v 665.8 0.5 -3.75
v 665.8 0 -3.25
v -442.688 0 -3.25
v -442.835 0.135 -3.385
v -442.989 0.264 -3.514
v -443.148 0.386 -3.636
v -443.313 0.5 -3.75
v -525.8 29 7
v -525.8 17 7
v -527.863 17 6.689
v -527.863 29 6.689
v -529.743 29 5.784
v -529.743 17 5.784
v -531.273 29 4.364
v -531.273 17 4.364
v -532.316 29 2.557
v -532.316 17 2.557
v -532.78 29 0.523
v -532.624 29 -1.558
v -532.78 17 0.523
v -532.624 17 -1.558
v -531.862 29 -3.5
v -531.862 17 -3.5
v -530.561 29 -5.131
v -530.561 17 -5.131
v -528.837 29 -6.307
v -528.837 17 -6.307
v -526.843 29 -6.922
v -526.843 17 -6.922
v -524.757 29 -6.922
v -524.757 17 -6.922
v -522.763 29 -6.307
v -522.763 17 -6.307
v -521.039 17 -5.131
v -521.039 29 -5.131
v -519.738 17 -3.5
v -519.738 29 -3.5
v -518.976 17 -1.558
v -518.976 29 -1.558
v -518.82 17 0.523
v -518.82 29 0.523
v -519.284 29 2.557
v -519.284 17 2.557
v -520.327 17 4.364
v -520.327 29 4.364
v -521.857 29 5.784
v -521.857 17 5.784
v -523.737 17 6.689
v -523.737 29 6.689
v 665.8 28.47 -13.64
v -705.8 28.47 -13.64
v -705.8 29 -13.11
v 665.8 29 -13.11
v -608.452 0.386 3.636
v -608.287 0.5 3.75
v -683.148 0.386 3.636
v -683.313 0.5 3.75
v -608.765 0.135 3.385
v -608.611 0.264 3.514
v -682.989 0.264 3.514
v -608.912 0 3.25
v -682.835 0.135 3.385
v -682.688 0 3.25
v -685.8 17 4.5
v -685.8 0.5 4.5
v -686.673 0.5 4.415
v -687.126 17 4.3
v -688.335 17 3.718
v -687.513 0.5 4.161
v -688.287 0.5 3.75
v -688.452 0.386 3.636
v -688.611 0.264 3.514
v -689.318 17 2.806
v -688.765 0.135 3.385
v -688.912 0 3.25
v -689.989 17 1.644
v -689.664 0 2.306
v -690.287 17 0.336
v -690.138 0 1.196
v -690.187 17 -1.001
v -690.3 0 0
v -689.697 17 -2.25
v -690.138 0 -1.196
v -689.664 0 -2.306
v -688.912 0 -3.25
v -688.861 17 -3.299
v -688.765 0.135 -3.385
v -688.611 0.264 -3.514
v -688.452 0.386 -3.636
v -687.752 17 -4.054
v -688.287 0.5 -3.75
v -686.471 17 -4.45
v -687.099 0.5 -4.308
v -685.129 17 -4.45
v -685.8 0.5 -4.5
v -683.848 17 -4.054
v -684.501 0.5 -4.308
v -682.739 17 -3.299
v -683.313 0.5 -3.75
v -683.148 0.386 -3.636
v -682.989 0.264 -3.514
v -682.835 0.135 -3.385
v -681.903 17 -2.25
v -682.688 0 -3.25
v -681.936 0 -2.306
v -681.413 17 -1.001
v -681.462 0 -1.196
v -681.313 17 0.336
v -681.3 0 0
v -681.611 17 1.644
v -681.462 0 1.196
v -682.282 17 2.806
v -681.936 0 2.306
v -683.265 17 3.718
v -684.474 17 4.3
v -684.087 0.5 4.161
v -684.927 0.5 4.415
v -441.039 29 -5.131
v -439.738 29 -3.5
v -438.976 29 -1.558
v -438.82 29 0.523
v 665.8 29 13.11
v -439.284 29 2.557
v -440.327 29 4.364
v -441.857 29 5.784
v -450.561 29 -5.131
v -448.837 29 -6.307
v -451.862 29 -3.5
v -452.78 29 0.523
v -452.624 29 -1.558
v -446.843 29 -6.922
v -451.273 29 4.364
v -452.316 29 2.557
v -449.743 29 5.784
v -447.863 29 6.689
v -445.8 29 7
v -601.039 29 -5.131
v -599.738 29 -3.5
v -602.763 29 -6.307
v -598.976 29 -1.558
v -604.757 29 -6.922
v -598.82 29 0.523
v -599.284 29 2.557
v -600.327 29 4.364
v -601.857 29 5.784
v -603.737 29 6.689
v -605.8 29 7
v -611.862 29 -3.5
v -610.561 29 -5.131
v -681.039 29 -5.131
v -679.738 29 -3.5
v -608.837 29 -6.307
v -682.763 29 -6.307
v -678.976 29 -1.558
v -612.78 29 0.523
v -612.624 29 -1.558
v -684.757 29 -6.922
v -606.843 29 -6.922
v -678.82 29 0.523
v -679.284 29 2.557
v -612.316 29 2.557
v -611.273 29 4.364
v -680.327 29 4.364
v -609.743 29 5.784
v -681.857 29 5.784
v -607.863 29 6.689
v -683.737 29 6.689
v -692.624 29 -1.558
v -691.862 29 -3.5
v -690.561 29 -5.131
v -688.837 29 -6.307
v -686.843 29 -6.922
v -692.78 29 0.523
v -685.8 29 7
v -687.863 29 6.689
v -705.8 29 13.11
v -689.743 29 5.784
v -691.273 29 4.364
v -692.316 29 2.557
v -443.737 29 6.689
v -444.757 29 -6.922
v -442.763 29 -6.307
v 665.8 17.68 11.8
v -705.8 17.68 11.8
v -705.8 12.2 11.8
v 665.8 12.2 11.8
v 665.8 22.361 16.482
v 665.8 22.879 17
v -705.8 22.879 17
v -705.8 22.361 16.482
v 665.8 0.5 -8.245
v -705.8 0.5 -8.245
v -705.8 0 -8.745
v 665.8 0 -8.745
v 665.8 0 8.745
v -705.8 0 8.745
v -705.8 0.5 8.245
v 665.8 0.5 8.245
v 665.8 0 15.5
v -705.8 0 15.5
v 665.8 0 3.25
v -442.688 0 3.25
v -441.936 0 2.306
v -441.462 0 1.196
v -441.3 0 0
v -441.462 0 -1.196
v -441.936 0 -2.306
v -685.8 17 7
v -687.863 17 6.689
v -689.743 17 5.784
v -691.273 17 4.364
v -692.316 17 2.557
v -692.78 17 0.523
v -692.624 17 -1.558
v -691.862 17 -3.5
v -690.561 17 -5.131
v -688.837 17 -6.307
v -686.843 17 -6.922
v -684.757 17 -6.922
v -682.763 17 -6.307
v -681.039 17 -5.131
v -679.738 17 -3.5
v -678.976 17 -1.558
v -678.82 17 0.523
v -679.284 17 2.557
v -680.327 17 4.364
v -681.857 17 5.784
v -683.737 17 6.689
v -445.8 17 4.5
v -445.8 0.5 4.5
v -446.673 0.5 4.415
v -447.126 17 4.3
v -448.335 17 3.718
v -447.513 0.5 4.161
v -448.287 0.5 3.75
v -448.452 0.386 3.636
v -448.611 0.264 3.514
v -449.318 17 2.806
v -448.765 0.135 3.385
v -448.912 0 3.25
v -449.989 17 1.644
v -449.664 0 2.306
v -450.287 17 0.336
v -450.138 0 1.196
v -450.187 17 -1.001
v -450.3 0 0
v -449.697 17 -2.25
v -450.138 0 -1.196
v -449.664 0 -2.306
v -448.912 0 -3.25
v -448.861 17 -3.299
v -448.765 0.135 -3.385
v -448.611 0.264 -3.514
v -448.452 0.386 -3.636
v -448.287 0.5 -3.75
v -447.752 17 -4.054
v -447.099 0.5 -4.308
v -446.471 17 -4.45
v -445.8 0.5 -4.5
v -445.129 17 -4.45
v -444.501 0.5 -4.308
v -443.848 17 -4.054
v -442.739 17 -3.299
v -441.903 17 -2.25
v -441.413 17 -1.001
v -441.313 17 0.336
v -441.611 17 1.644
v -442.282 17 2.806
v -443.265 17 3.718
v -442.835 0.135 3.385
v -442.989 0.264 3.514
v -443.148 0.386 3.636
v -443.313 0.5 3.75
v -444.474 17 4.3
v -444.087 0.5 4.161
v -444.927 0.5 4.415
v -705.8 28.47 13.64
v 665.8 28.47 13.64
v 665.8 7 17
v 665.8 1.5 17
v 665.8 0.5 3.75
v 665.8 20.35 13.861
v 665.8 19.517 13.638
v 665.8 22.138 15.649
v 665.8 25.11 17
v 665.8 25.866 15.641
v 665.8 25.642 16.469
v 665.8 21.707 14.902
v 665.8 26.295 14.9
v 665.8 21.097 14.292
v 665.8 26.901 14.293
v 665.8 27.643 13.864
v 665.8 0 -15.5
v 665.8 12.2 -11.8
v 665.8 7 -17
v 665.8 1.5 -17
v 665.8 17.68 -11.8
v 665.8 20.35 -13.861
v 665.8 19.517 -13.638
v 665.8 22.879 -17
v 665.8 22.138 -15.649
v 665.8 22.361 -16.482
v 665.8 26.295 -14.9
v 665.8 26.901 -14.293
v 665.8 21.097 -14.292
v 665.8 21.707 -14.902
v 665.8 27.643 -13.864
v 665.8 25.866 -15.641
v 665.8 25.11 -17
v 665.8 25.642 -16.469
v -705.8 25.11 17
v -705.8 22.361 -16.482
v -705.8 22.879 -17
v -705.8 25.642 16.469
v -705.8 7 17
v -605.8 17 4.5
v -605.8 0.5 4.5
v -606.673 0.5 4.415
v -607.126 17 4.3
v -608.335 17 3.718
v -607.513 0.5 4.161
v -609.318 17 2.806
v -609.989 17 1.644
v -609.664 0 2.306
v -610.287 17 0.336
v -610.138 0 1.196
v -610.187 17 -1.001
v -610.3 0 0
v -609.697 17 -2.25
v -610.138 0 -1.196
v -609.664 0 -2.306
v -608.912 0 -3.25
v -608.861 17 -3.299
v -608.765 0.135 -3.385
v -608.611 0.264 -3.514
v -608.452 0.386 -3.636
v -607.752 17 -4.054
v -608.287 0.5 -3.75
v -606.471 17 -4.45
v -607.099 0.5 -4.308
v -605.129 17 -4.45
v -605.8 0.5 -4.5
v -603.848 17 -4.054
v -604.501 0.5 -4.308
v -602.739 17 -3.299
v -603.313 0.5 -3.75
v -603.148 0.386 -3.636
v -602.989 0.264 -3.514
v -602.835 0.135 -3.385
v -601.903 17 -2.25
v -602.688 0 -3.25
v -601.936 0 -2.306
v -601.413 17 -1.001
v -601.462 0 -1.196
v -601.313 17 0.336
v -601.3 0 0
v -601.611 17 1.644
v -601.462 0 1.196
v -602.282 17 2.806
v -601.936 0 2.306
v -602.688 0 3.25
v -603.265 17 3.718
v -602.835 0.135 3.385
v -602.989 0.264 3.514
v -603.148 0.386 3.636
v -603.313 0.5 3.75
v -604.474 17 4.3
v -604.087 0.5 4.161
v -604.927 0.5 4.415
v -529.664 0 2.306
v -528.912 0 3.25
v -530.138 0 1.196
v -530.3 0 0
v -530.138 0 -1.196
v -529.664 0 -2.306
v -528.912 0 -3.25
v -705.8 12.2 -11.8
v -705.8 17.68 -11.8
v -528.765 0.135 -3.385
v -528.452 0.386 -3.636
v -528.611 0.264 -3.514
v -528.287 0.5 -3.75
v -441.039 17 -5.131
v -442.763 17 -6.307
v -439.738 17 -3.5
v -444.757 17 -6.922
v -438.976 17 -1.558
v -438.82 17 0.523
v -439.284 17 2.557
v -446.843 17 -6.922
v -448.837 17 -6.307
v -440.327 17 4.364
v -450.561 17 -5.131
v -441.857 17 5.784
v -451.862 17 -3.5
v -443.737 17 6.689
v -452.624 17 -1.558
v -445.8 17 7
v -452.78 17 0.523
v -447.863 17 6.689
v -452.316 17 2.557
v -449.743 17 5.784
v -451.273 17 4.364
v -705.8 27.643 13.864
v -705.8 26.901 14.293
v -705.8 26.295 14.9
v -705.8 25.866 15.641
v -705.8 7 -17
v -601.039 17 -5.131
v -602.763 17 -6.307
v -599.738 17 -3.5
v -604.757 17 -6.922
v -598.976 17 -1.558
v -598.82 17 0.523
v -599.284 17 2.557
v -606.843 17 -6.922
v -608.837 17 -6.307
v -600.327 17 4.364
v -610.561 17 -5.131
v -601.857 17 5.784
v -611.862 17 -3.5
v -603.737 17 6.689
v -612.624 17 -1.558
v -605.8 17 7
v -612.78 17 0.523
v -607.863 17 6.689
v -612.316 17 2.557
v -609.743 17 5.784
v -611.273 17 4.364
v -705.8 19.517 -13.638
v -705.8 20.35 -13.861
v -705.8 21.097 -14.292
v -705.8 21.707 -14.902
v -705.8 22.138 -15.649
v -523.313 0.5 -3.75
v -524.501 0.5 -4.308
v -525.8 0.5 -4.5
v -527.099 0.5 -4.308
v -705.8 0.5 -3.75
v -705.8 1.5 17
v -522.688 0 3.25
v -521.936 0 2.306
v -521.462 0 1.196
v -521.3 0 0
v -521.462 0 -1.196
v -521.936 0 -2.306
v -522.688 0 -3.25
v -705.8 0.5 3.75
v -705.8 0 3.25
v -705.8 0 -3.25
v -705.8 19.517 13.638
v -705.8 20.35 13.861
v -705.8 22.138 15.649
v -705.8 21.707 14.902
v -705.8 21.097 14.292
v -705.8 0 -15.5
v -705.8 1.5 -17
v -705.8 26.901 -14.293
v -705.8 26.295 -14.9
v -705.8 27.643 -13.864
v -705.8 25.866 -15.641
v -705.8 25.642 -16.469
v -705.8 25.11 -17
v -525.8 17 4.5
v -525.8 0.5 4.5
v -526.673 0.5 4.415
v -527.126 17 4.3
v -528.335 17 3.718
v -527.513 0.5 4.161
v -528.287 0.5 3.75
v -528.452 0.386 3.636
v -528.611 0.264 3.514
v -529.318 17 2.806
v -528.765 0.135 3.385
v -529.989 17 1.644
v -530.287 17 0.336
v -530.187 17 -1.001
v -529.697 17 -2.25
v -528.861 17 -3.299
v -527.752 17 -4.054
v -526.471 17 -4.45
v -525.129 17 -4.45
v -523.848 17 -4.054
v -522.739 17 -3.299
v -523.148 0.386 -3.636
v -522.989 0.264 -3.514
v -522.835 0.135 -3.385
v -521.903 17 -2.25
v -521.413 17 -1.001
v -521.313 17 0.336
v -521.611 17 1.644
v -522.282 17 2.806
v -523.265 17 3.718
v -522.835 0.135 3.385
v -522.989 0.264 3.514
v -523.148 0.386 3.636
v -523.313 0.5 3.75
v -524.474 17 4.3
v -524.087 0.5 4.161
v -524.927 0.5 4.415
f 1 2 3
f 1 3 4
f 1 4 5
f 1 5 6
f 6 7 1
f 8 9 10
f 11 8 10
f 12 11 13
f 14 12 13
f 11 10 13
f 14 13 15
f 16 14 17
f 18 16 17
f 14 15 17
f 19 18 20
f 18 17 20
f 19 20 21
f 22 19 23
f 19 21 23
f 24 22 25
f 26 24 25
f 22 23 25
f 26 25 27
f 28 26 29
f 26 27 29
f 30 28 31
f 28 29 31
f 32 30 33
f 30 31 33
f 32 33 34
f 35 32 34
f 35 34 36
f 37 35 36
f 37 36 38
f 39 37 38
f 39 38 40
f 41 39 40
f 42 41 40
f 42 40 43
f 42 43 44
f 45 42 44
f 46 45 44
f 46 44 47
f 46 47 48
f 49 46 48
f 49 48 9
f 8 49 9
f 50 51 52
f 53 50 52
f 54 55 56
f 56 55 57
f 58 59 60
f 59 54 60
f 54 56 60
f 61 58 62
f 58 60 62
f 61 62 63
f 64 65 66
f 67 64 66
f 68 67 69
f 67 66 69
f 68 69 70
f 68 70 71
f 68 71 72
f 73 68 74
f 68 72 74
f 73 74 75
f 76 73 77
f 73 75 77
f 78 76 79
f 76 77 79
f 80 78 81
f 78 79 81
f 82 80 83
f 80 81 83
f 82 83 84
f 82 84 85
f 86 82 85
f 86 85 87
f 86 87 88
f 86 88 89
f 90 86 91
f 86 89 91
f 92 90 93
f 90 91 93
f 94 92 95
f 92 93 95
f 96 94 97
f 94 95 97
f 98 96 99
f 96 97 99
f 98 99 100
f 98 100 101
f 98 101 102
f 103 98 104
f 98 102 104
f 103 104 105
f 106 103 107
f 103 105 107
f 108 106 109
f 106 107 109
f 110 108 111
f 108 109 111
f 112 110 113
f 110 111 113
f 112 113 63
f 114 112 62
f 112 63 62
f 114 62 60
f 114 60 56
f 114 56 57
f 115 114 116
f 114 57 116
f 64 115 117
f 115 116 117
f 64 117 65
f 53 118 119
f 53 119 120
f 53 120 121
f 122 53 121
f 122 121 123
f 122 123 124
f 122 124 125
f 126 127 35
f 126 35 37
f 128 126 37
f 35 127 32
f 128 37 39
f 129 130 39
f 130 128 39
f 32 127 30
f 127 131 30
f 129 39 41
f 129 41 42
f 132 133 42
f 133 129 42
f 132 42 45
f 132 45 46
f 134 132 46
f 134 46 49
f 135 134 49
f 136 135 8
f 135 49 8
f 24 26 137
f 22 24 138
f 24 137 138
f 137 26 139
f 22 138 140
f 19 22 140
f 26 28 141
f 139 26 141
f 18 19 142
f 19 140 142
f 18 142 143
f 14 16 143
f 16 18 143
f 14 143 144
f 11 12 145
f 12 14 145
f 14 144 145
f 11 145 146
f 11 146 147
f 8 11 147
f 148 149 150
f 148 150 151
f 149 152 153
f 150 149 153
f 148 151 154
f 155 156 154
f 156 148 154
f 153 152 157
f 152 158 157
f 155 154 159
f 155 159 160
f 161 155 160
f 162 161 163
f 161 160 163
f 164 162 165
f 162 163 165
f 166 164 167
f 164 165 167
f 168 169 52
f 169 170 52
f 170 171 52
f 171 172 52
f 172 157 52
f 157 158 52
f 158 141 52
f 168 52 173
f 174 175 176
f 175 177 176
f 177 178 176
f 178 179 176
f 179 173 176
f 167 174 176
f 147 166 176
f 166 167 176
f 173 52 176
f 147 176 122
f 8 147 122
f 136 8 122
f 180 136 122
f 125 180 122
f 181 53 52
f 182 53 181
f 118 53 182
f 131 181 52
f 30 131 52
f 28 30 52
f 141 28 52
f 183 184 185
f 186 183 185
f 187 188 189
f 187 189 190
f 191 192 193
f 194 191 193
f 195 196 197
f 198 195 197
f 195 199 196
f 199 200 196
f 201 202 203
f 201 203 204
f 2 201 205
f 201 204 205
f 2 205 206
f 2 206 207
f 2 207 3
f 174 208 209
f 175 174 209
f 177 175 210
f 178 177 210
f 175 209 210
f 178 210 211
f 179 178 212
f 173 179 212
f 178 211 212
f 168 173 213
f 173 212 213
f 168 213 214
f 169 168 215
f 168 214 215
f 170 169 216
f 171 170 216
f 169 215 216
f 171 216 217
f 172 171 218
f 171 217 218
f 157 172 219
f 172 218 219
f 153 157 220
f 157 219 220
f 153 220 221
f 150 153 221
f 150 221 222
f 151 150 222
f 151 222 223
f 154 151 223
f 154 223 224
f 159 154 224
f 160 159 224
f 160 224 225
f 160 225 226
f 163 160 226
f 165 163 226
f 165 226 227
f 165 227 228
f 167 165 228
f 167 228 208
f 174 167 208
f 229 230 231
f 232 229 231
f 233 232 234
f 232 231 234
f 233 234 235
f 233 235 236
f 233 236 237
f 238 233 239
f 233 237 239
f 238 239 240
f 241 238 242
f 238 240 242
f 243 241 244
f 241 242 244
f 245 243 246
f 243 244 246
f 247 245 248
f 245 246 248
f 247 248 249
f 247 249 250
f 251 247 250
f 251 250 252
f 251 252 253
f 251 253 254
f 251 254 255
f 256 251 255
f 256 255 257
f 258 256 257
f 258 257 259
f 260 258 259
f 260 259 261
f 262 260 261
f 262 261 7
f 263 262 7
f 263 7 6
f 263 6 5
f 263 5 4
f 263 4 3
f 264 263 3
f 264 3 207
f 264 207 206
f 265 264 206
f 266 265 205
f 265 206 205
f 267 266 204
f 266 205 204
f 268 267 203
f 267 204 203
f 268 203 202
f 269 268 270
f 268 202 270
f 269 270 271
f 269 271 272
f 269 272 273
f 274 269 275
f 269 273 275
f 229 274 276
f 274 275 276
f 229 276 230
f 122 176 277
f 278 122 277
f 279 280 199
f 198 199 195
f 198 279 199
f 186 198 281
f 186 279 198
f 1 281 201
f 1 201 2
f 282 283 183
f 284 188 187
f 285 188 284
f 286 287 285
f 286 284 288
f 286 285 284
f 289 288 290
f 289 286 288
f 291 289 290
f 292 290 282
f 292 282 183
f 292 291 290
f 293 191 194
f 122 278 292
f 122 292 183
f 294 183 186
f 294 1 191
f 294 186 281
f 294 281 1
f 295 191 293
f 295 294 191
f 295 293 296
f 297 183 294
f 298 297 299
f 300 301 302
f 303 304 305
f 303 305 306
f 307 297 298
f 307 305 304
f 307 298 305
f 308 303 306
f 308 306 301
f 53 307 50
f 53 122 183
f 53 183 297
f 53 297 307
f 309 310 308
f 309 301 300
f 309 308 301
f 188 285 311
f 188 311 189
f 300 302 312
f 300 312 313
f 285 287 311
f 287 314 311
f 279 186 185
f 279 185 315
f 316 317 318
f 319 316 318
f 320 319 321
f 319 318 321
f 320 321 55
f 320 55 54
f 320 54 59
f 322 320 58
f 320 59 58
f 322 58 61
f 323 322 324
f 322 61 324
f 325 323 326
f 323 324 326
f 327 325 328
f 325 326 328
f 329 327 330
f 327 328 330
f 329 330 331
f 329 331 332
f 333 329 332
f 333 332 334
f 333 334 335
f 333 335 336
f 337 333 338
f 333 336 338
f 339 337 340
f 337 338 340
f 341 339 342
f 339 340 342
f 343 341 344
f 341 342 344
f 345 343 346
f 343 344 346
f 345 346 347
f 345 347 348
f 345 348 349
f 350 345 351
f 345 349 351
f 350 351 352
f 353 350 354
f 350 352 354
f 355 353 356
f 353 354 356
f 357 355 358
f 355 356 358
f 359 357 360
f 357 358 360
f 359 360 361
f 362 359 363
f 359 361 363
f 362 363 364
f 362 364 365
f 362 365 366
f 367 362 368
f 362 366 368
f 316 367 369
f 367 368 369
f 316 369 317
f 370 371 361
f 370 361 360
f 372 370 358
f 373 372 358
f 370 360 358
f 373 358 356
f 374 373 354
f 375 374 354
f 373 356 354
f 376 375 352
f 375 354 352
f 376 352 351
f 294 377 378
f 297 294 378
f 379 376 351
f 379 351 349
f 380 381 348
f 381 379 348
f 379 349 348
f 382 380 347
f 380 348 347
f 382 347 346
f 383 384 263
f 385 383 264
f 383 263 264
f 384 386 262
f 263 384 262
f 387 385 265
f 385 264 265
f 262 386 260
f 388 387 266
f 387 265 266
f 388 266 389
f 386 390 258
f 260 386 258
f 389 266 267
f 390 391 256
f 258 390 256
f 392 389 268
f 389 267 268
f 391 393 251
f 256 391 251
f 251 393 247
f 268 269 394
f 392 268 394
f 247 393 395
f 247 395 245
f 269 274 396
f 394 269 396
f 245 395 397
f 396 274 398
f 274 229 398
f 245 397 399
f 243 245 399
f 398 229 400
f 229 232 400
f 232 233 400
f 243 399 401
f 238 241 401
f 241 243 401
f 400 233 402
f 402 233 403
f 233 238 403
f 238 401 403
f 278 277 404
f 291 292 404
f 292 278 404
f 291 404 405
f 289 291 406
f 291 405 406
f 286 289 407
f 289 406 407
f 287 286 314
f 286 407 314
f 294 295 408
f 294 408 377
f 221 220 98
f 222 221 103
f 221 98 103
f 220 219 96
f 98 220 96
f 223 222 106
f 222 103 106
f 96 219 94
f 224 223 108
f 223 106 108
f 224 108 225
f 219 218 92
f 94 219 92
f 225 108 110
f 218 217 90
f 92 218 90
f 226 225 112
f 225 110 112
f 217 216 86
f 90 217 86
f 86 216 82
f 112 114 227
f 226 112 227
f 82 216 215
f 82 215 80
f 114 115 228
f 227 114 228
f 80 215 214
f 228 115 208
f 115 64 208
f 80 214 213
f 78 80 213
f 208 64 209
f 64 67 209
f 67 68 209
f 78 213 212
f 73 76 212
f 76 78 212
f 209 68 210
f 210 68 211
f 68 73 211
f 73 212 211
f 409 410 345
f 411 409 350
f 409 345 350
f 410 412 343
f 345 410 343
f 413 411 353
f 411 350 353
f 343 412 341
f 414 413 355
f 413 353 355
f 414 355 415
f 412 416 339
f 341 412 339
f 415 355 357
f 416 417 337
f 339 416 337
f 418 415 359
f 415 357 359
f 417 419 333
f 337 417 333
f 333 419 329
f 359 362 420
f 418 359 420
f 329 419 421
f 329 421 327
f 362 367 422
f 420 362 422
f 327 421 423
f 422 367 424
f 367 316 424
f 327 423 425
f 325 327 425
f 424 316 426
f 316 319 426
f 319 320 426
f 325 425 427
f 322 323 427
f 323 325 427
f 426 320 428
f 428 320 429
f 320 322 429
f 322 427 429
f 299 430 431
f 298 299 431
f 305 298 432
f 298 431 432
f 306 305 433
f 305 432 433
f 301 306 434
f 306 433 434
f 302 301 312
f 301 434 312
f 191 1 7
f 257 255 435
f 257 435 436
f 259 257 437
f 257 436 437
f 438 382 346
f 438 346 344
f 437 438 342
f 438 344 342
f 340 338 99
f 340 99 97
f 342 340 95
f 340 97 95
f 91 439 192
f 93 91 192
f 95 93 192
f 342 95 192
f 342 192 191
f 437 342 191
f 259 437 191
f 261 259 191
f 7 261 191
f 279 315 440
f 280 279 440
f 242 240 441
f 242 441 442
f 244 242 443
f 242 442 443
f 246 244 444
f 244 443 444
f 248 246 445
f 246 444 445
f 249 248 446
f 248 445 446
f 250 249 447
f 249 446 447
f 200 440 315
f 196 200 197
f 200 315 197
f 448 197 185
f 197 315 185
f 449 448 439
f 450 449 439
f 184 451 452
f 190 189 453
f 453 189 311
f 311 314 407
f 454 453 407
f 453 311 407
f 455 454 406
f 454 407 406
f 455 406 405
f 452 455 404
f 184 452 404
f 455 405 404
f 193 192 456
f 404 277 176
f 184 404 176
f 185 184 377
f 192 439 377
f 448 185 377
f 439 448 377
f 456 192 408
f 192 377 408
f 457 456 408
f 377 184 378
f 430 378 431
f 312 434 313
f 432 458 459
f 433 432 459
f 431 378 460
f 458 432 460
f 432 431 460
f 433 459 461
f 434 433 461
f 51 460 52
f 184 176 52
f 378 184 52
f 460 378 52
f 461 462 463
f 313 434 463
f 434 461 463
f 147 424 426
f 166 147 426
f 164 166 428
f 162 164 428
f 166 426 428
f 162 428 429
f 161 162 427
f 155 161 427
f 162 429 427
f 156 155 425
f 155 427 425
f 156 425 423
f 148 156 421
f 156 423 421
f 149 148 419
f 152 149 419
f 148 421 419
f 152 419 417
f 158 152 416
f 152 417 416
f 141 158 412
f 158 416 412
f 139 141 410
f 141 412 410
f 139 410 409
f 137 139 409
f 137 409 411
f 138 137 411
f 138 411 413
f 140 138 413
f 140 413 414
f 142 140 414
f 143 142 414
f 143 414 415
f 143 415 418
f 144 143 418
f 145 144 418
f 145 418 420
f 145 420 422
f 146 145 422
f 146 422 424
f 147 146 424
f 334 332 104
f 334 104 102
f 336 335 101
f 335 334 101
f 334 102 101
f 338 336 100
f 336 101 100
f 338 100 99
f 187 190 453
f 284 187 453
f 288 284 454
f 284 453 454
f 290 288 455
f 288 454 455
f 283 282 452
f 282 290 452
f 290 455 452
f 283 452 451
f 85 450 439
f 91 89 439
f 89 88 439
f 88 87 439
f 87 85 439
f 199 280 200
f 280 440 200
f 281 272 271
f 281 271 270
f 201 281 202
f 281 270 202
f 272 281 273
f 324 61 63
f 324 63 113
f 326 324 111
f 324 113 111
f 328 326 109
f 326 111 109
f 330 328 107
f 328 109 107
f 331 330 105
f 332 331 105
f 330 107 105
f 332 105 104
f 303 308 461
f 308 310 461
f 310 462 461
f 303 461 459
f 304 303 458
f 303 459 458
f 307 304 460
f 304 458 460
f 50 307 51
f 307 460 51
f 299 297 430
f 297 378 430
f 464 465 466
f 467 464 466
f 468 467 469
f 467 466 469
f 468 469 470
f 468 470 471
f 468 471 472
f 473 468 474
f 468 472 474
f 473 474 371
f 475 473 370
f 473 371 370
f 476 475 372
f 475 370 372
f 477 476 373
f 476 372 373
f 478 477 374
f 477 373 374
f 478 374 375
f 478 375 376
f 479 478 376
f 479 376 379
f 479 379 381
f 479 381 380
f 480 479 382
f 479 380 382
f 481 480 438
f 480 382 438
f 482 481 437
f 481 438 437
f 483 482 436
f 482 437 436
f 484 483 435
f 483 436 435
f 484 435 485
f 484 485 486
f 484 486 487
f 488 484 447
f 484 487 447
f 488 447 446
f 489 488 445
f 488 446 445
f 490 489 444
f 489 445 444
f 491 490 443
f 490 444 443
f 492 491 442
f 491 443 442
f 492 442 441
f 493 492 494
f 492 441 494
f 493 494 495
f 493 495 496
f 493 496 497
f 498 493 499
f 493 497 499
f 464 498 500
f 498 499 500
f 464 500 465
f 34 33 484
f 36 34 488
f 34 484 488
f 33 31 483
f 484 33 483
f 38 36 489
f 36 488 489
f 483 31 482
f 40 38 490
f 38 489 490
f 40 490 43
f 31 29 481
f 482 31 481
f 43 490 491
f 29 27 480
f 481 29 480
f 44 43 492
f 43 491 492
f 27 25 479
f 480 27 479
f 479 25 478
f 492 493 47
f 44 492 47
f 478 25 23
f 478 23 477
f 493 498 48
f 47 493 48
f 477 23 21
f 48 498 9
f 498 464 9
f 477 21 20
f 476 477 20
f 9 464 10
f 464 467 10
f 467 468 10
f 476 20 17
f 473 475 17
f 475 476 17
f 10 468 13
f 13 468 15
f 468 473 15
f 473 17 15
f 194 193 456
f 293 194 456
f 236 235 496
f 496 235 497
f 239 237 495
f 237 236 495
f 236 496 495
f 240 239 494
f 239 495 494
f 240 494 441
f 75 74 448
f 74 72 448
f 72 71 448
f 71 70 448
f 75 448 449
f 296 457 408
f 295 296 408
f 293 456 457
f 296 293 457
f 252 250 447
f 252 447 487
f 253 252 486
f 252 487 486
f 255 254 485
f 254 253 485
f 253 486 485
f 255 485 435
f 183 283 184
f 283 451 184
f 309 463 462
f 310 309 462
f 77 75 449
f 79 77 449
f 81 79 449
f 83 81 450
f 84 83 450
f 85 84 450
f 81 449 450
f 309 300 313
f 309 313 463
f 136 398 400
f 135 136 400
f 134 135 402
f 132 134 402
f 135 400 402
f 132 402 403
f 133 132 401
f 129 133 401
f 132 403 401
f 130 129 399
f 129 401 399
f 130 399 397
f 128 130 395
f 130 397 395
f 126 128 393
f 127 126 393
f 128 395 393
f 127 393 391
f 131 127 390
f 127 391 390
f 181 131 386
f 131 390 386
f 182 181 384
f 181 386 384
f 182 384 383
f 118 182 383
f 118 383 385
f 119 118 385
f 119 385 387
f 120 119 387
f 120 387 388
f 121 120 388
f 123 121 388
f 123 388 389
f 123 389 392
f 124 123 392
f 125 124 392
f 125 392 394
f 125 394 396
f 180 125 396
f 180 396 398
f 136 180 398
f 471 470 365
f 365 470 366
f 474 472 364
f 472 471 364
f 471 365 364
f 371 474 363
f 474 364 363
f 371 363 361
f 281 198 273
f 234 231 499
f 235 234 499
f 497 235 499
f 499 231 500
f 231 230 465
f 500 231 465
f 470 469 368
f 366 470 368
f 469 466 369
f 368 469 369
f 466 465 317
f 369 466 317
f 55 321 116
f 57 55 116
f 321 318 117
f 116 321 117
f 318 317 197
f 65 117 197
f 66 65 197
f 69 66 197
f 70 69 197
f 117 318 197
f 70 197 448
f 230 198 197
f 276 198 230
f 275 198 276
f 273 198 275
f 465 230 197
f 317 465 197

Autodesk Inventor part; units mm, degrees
sketch "Sketch_18" plane through (-20, 0, 0) normal (1, 0, 0) x (0, 0, -1)
  line L0 (-17, 1.5) -> (-15.5, 0)
  line L1 (-15.5, 0) -> (-8.745, 0)
  line L2 (-8.745, 0) -> (-8.245, 0.5)
  line L3 (-8.245, 0.5) -> (-3.75, 0.5)
  line L4 (-3.75, 0.5) -> (-3.25, 0)
  line L5 (-3.25, 0) -> (3.25, 0)
  line L6 (3.25, 0) -> (3.75, 0.5)
  line L7 (3.75, 0.5) -> (8.245, 0.5)
  line L8 (8.245, 0.5) -> (8.745, 0)
  line L9 (8.745, 0) -> (15.5, 0)
  line L10 (15.5, 0) -> (17, 1.5)
  line L11 (17, 1.5) -> (17, 7.0002)
  line L12 (17, 7.0002) -> (11.8003, 12.1999)
  line L13 (11.8003, 12.1999) -> (11.8003, 17.6796)
  line L14 (11.8003, 17.6796) -> (13.6381, 19.5174)
  arc A0 (16.4816, 22.3609) -> (13.6381, 19.5174) centre (16.9102, 19.0889) ccw
  line L15 (16.4816, 22.3609) -> (17, 22.8793)
  line L16 (17, 22.8793) -> (17, 25.1102)
  line L17 (17, 25.1102) -> (16.4686, 25.6415)
  arc A1 (13.6398, 28.4703) -> (16.4686, 25.6415) centre (16.9102, 28.9119) ccw
  line L18 (13.6398, 28.4703) -> (13.1102, 29)
  line L19 (13.1102, 29) -> (-13.1102, 29)
  line L20 (-13.1102, 29) -> (-13.6398, 28.4703)
  arc A2 (-16.4686, 25.6415) -> (-13.6398, 28.4703) centre (-16.9102, 28.9119) ccw
  line L21 (-16.4686, 25.6415) -> (-17, 25.1102)
  line L22 (-17, 25.1102) -> (-17, 22.8793)
  line L23 (-17, 22.8793) -> (-16.4816, 22.3609)
  arc A3 (-13.6381, 19.5174) -> (-16.4816, 22.3609) centre (-16.9102, 19.0889) ccw
  line L24 (-13.6381, 19.5174) -> (-11.8003, 17.6796)
  line L25 (-11.8003, 17.6796) -> (-11.8003, 12.1999)
  line L26 (-11.8003, 12.1999) -> (-17, 7.0002)
  line L27 (-17, 7.0002) -> (-17, 1.5)
extrude "Extrusion1" add sketch "Sketch_18" along normal mid plane 1371.6
sketch "Sketch2" plane through (-705.8, 29, 13.1102) normal (0, 1, 0) x (1, 0, 0)
  point P0 (20, 13.1102)
hole "Hole1" at (-685.8, 29, 0) direction (0, -1, 0) diameter 9 depth 29 counterbore diameter 14 counterbore depth 12
pattern_linear "Rectangular Pattern1" count 4 spacing 80 along (1, 0, 0) of "Hole1"
ref_plane "4dummy_XY" through (0, 0, 0) normal (1, 0, 0) x (0, 0, -1)
ref_plane "4dummy_YZ" through (0, 0, 0) normal (0, 0, -1) x (0, 1, 0)
ref_plane "4dummy_ZX" through (0, 0, 0) normal (0, 1, 0) x (1, 0, 0)
ref_plane "4slide_XY" through (-20, 7.5, 0) normal (1, 0, 0) x (0, 0, -1)
ref_plane "4slide_YZ" through (-20, 7.5, 0) normal (0, 0, -1) x (0, 1, 0)
ref_plane "4slide_ZX" through (-20, 7.5, 0) normal (0, 1, 0) x (1, 0, 0)
ref_plane "4track_XY" through (0, 0, 0) normal (0, 0, 1) x (1, 0, 0)
ref_plane "4track_YZ" through (0, 0, 0) normal (1, 0, 0) x (0, 1, 0)
ref_plane "4track_ZX" through (0, 0, 0) normal (0, 1, 0) x (0, 0, 1)
properties part number "HSR35R128020 Rail"
